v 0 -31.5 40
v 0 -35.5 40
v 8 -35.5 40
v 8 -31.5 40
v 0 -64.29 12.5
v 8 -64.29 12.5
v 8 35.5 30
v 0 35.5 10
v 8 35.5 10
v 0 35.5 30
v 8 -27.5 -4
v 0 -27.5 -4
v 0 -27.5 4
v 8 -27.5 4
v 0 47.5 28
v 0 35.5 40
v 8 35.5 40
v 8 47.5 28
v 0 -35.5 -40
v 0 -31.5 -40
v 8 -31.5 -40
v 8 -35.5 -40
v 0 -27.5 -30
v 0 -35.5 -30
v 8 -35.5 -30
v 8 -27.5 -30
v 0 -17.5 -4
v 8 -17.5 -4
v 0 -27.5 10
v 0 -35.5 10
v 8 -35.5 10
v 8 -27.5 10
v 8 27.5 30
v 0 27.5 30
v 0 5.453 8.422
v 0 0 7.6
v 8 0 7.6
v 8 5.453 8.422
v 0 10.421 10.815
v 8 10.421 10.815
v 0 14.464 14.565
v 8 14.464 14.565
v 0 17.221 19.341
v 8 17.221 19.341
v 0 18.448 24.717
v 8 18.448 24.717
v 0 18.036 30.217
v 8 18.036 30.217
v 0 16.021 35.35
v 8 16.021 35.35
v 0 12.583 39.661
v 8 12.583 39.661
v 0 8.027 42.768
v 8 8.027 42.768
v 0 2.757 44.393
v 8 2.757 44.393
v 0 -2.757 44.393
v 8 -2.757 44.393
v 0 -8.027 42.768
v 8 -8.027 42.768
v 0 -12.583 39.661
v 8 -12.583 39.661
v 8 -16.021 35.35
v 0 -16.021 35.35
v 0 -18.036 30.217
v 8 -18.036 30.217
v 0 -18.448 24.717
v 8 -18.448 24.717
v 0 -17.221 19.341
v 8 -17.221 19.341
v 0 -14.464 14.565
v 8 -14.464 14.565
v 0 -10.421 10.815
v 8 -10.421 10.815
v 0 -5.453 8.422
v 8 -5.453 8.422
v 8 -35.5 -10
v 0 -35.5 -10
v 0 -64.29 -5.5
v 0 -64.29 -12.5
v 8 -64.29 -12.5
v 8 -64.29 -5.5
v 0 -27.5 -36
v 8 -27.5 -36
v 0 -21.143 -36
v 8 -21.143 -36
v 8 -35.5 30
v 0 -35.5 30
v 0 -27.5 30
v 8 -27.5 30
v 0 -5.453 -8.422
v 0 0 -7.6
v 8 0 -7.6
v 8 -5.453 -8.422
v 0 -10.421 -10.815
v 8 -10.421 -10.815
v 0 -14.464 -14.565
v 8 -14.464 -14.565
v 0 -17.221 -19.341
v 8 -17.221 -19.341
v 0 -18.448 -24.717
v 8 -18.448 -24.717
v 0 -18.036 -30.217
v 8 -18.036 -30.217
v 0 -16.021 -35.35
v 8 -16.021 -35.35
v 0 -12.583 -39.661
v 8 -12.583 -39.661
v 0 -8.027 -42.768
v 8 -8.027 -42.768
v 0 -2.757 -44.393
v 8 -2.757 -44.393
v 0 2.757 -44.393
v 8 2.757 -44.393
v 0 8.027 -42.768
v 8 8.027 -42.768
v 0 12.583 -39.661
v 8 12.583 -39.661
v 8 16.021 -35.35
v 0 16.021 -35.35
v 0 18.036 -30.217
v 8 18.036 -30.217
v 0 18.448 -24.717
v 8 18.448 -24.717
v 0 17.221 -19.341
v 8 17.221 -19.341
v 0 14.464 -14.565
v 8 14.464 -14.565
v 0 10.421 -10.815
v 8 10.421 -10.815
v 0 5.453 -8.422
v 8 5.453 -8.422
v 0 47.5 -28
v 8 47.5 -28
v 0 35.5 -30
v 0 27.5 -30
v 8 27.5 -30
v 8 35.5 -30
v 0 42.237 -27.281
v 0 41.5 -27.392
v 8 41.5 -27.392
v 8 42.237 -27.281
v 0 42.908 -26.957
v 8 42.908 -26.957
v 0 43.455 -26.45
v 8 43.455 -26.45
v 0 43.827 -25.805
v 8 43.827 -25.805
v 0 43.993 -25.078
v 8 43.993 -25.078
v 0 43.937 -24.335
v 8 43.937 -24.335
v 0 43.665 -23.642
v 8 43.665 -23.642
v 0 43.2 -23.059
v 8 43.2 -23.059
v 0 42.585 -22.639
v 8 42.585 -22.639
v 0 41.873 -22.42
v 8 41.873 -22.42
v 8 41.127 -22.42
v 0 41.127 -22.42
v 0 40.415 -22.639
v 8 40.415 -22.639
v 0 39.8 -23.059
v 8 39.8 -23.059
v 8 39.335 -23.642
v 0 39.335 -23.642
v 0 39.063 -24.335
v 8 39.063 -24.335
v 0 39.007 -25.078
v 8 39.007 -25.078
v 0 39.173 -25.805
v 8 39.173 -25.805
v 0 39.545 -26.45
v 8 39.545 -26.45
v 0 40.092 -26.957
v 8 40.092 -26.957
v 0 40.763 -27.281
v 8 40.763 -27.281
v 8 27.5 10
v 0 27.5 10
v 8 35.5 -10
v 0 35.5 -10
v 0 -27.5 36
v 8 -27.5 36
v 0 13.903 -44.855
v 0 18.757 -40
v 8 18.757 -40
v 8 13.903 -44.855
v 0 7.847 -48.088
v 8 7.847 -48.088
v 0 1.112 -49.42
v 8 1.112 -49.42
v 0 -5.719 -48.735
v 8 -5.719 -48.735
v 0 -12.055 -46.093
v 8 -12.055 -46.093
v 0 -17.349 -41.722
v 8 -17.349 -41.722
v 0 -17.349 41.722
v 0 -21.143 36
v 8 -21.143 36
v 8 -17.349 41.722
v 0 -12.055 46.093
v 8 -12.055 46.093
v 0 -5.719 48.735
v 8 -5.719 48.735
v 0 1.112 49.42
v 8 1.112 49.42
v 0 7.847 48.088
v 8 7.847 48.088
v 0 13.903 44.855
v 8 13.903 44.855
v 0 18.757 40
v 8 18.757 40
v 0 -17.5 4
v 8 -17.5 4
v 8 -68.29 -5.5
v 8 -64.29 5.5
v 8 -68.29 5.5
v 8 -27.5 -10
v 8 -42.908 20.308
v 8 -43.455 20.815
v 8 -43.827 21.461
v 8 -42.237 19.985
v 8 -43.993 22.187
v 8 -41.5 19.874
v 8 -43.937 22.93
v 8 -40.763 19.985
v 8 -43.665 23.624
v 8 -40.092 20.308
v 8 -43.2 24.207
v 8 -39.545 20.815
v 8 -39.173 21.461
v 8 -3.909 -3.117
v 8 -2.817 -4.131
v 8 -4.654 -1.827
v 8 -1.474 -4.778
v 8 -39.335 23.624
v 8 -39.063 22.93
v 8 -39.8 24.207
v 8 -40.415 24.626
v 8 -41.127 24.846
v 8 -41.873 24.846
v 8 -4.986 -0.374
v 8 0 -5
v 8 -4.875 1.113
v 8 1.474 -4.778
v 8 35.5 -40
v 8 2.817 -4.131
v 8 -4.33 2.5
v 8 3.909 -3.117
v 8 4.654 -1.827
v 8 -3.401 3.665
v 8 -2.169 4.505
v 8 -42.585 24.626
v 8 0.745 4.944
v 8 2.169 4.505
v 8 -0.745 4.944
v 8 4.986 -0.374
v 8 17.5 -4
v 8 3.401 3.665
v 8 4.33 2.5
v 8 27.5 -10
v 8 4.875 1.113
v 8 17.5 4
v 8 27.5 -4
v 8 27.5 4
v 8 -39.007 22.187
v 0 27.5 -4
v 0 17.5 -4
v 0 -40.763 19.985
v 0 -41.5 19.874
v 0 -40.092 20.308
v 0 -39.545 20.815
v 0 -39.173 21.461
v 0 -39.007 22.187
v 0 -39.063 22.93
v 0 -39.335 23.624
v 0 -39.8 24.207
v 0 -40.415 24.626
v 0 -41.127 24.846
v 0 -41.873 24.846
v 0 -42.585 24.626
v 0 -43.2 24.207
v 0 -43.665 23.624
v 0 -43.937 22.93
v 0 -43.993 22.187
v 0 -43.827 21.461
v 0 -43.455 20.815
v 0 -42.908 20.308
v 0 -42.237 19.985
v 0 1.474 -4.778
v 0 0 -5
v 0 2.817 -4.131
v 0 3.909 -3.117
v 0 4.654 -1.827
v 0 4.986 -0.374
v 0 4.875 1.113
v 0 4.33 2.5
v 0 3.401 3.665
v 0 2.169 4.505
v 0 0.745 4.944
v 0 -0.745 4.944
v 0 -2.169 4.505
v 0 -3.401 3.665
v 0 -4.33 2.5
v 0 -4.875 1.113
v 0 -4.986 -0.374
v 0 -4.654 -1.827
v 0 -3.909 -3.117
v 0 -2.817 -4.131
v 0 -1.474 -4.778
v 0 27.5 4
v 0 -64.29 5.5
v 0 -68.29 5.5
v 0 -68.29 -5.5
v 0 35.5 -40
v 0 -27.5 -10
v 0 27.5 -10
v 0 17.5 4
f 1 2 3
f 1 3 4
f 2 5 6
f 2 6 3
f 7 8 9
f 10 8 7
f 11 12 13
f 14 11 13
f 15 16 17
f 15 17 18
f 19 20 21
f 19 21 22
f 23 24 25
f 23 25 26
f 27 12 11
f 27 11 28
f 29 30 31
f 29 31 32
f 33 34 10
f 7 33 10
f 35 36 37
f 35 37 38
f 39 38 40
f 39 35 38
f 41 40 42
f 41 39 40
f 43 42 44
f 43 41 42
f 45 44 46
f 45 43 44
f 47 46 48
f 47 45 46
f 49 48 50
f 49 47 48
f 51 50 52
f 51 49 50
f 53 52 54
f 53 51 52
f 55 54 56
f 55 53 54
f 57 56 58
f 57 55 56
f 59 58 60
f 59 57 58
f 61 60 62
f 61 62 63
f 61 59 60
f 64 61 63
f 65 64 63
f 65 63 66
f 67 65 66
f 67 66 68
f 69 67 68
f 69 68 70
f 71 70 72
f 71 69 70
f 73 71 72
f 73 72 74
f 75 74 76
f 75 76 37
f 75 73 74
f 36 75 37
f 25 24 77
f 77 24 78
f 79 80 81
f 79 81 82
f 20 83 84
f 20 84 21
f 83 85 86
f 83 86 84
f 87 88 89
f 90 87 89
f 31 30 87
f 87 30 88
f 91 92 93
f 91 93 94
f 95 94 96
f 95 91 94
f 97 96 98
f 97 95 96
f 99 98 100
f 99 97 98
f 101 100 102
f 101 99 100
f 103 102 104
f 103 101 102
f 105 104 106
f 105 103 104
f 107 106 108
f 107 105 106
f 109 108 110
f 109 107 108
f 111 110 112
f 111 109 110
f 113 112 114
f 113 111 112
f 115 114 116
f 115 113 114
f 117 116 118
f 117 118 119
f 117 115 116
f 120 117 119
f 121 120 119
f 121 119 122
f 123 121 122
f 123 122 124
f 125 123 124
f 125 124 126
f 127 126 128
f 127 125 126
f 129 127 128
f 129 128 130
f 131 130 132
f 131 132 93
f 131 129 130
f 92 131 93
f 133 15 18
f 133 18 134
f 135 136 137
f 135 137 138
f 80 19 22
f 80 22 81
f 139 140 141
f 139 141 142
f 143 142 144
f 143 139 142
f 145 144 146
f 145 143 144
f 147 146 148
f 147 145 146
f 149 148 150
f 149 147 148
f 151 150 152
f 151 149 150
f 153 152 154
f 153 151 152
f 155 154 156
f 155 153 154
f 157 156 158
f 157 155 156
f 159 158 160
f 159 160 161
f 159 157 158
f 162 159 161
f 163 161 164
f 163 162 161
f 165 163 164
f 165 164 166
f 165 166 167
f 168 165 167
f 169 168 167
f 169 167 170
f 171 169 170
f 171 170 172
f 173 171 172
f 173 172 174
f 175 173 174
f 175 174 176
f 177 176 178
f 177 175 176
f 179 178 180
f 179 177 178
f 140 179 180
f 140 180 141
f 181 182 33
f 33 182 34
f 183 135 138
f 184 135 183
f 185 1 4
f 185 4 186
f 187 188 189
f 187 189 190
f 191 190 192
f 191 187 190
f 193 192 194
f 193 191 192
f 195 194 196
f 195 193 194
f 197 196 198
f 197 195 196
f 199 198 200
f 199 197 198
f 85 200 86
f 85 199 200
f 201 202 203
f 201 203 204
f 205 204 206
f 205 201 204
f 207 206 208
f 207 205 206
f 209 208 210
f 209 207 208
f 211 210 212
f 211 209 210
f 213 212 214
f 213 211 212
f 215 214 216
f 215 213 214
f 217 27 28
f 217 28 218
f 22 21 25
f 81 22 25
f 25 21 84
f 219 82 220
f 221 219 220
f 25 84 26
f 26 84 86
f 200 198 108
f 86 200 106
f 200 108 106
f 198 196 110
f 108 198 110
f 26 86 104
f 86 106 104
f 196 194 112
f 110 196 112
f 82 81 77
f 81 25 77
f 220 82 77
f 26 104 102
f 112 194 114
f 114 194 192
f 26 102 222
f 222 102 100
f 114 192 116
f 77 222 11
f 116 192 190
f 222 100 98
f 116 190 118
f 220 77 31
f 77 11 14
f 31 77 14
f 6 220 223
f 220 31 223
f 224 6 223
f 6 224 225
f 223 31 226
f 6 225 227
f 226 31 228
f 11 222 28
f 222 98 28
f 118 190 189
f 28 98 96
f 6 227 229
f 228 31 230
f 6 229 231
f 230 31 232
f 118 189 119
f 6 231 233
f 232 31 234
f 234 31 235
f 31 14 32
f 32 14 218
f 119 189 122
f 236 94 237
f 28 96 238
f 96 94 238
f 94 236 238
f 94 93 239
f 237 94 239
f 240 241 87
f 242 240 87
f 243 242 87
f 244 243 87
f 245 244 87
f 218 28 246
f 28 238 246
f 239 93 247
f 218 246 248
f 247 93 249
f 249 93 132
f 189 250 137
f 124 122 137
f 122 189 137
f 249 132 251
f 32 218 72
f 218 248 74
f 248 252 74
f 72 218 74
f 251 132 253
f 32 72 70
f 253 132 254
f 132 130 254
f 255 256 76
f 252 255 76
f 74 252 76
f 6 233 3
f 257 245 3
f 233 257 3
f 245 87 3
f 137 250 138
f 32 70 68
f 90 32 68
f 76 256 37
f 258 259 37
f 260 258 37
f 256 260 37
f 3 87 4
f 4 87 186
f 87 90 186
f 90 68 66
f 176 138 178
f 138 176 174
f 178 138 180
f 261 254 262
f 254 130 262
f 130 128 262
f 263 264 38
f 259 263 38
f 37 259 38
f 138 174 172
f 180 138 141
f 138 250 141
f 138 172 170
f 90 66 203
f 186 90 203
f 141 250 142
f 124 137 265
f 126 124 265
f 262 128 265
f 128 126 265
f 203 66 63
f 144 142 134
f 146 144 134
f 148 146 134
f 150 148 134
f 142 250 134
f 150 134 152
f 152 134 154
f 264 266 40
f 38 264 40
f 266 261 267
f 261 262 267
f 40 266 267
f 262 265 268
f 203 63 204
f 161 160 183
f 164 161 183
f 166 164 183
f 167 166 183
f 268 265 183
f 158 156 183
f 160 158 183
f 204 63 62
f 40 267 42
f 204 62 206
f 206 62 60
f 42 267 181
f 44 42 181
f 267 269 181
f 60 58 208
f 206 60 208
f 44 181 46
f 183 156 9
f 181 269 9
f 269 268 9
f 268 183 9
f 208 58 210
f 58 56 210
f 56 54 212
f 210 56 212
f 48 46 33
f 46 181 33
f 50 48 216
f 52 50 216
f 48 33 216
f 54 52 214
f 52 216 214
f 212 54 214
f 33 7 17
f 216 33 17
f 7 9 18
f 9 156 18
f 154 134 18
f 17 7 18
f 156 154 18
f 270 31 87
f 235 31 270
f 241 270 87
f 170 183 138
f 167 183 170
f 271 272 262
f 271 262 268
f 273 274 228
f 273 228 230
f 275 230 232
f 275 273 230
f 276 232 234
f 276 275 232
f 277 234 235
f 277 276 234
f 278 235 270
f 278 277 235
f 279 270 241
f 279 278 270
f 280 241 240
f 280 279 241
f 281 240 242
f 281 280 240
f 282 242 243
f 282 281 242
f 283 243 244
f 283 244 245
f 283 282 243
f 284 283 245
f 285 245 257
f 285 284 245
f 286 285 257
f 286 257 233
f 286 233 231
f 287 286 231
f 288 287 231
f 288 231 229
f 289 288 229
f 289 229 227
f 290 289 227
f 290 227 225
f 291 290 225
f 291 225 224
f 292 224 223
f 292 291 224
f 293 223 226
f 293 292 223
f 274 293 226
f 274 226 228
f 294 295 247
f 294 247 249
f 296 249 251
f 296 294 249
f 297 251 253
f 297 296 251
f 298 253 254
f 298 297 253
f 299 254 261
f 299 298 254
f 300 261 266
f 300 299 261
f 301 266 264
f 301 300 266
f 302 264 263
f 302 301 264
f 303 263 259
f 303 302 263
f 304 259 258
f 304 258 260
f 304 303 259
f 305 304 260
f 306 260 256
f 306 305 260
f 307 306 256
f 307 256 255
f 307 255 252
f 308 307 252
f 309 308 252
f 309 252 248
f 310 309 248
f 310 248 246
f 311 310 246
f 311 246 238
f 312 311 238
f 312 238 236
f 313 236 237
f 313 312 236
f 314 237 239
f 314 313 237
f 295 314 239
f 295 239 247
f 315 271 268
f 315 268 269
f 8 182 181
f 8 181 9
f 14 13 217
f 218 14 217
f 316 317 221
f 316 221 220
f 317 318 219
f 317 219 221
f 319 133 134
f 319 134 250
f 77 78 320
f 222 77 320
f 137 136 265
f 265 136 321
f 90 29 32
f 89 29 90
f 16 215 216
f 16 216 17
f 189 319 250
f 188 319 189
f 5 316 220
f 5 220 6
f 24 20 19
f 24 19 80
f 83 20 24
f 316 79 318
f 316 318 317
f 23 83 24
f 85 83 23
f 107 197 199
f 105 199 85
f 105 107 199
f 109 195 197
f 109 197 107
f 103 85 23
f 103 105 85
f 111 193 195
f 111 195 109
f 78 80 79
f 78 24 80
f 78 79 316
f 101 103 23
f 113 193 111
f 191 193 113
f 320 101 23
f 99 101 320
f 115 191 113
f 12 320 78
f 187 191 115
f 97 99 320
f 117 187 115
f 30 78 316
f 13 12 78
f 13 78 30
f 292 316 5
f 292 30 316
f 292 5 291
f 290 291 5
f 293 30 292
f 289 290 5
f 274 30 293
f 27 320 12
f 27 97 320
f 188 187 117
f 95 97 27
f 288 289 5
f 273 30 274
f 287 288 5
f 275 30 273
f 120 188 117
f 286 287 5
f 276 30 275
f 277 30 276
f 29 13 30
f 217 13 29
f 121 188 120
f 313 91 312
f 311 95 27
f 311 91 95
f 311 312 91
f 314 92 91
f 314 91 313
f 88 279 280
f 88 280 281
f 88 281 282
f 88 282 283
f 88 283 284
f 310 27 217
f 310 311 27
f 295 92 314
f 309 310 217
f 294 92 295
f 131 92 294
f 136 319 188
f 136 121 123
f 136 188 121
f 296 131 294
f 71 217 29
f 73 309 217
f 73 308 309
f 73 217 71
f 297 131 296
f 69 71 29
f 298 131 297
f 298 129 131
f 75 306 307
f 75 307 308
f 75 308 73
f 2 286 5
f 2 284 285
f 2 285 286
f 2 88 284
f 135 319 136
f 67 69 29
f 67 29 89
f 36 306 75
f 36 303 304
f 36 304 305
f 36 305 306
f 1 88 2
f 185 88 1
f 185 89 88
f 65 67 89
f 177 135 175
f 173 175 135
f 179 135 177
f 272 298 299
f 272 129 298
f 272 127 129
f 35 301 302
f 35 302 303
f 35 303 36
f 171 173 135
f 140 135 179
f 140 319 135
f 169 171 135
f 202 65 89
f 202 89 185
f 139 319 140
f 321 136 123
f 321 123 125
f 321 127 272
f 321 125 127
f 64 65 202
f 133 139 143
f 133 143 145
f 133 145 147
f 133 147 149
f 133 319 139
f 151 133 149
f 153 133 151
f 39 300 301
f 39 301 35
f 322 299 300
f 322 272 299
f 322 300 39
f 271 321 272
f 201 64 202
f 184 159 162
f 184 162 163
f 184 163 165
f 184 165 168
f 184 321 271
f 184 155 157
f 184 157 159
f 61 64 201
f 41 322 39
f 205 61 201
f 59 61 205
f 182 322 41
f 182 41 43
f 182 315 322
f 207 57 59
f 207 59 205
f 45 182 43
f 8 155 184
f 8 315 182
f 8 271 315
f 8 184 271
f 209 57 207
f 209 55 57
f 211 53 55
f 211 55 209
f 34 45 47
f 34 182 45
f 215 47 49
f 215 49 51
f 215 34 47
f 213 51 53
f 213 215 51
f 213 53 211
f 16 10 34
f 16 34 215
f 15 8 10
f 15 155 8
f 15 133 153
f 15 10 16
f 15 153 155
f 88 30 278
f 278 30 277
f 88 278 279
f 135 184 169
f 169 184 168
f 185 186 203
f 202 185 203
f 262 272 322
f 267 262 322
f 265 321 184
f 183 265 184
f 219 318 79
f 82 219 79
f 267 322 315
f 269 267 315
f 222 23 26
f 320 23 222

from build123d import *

# Parameters (mm, degrees)
SKETCH1_R           = 2.5
SKETCH1_R_2         = 18.5
SKETCH1_R_3         = 5
BOSS_EXTRUDE1_DEPTH = 8
CUT_EXTRUDE1_REACH  = 86.69
SKETCH2_W           = 20
SKETCH2_H           = 8
SKETCH2_W_2         = 8
SKETCH2_H_2         = 10
SKETCH2_W_3         = 7
SKETCH2_H_3         = 4


with BuildPart() as part:
    # Sketch1 → Boss-Extrude1 (new body)
    with BuildSketch(Plane(origin=(0, 0, 0), x_dir=(0, 0, -1), z_dir=(1, 0, 0))):
        with BuildLine():
            Line((-12.5, -64.29), (-40, -35.5))
            Line((-40, -35.5), (-40, -31.5))
            Line((-40, -31.5), (-36, -27.5))
            Line((-36, -27.5), (-36, -21.143055078))
            ThreePointArc((-36, -21.143055078), (-49.329627244, -2.32877567), (-40, 18.757099403))
            Line((-40, 18.757099403), (-40, 35.5))
            Line((-40, 35.5), (-28, 47.5))
            Line((-28, 47.5), (28, 47.5))
            Line((28, 47.5), (40, 35.5))
            Line((40, 35.5), (40, 18.757099403))
            ThreePointArc((40, 18.757099403), (49.329627244, -2.32877567), (36, -21.143055078))
            Line((36, -21.143055078), (36, -27.5))
            Line((36, -27.5), (40, -31.5))
            Line((40, -31.5), (40, -35.5))
            Line((40, -35.5), (12.5, -64.29))
            Line((12.5, -64.29), (12.5, -68.29))
            Line((12.5, -68.29), (-12.5, -68.29))
            Line((-12.5, -68.29), (-12.5, -64.29))
        make_face()
        with Locations((-22.373880505, -41.5)):
            Circle(SKETCH1_R, mode=Mode.SUBTRACT)
        with Locations((24.891578032, 41.5)):
            Circle(SKETCH1_R, mode=Mode.SUBTRACT)
        with Locations((-26.1, 0)):
            Circle(SKETCH1_R_2, mode=Mode.SUBTRACT)
        with Locations(Location((26.1, 0, 0), (0, 0, 180))):
            Circle(SKETCH1_R_2, mode=Mode.SUBTRACT)
        Circle(SKETCH1_R_3, mode=Mode.SUBTRACT)
    extrude(amount=BOSS_EXTRUDE1_DEPTH)

    # Sketch2 → Cut-Extrude1 (cut, up to next)
    with BuildSketch(Plane.ZY, mode=Mode.PRIVATE) as cut_extrude1_sk1:
        with Locations((20, -31.5)):
            Rectangle(SKETCH2_W, SKETCH2_H)
    cut_extrude1_tool1 = extrude(cut_extrude1_sk1.sketch, amount=-CUT_EXTRUDE1_REACH, mode=Mode.PRIVATE) & part.part
    # Sketch2 → Cut-Extrude1 (cut, up to next)
    with BuildSketch(Plane.ZY, mode=Mode.PRIVATE) as cut_extrude1_sk2:
        with Locations((-20, -31.5)):
            Rectangle(SKETCH2_W, SKETCH2_H)
    cut_extrude1_tool2 = extrude(cut_extrude1_sk2.sketch, amount=-CUT_EXTRUDE1_REACH, mode=Mode.PRIVATE) & part.part
    # Sketch2 → Cut-Extrude1 (cut, up to next)
    with BuildSketch(Plane.ZY, mode=Mode.PRIVATE) as cut_extrude1_sk3:
        with Locations((20, 31.5)):
            Rectangle(SKETCH2_W, SKETCH2_H)
    cut_extrude1_tool3 = extrude(cut_extrude1_sk3.sketch, amount=-CUT_EXTRUDE1_REACH, mode=Mode.PRIVATE) & part.part
    # Sketch2 → Cut-Extrude1 (cut, up to next)
    with BuildSketch(Plane.ZY, mode=Mode.PRIVATE) as cut_extrude1_sk4:
        with Locations((-20, 31.5)):
            Rectangle(SKETCH2_W, SKETCH2_H)
    cut_extrude1_tool4 = extrude(cut_extrude1_sk4.sketch, amount=-CUT_EXTRUDE1_REACH, mode=Mode.PRIVATE) & part.part
    # Sketch2 → Cut-Extrude1 (cut, up to next)
    with BuildSketch(Plane.ZY, mode=Mode.PRIVATE) as cut_extrude1_sk5:
        with Locations((0, 22.5)):
            Rectangle(SKETCH2_W_2, SKETCH2_H_2)
    cut_extrude1_tool5 = extrude(cut_extrude1_sk5.sketch, amount=-CUT_EXTRUDE1_REACH, mode=Mode.PRIVATE) & part.part
    # Sketch2 → Cut-Extrude1 (cut, up to next)
    with BuildSketch(Plane.ZY, mode=Mode.PRIVATE) as cut_extrude1_sk6:
        with Locations((0, -22.5)):
            Rectangle(SKETCH2_W_2, SKETCH2_H_2)
    cut_extrude1_tool6 = extrude(cut_extrude1_sk6.sketch, amount=-CUT_EXTRUDE1_REACH, mode=Mode.PRIVATE) & part.part
    # Sketch2 → Cut-Extrude1 (cut, up to next)
    with BuildSketch(Plane.ZY, mode=Mode.PRIVATE) as cut_extrude1_sk7:
        with Locations((9, -66.29)):
            Rectangle(SKETCH2_W_3, SKETCH2_H_3)
    cut_extrude1_tool7 = extrude(cut_extrude1_sk7.sketch, amount=-CUT_EXTRUDE1_REACH, mode=Mode.PRIVATE) & part.part
    # Sketch2 → Cut-Extrude1 (cut, up to next)
    with BuildSketch(Plane.ZY, mode=Mode.PRIVATE) as cut_extrude1_sk8:
        with Locations((-9, -66.29)):
            Rectangle(SKETCH2_W_3, SKETCH2_H_3)
    cut_extrude1_tool8 = extrude(cut_extrude1_sk8.sketch, amount=-CUT_EXTRUDE1_REACH, mode=Mode.PRIVATE) & part.part
    add(cut_extrude1_tool1.solids().sort_by_distance((0, -31.5, 20))[0], mode=Mode.SUBTRACT)
    add(cut_extrude1_tool2.solids().sort_by_distance((0, -31.5, -20))[0], mode=Mode.SUBTRACT)
    add(cut_extrude1_tool3.solids().sort_by_distance((0, 31.5, 20))[0], mode=Mode.SUBTRACT)
    add(cut_extrude1_tool4.solids().sort_by_distance((0, 31.5, -20))[0], mode=Mode.SUBTRACT)
    add(cut_extrude1_tool5.solids().sort_by_distance((0, 22.5, 0))[0], mode=Mode.SUBTRACT)
    add(cut_extrude1_tool6.solids().sort_by_distance((0, -22.5, 0))[0], mode=Mode.SUBTRACT)
    add(cut_extrude1_tool7.solids().sort_by_distance((0, -66.29, 9))[0], mode=Mode.SUBTRACT)
    add(cut_extrude1_tool8.solids().sort_by_distance((0, -66.29, -9))[0], mode=Mode.SUBTRACT)


solid = part.part
